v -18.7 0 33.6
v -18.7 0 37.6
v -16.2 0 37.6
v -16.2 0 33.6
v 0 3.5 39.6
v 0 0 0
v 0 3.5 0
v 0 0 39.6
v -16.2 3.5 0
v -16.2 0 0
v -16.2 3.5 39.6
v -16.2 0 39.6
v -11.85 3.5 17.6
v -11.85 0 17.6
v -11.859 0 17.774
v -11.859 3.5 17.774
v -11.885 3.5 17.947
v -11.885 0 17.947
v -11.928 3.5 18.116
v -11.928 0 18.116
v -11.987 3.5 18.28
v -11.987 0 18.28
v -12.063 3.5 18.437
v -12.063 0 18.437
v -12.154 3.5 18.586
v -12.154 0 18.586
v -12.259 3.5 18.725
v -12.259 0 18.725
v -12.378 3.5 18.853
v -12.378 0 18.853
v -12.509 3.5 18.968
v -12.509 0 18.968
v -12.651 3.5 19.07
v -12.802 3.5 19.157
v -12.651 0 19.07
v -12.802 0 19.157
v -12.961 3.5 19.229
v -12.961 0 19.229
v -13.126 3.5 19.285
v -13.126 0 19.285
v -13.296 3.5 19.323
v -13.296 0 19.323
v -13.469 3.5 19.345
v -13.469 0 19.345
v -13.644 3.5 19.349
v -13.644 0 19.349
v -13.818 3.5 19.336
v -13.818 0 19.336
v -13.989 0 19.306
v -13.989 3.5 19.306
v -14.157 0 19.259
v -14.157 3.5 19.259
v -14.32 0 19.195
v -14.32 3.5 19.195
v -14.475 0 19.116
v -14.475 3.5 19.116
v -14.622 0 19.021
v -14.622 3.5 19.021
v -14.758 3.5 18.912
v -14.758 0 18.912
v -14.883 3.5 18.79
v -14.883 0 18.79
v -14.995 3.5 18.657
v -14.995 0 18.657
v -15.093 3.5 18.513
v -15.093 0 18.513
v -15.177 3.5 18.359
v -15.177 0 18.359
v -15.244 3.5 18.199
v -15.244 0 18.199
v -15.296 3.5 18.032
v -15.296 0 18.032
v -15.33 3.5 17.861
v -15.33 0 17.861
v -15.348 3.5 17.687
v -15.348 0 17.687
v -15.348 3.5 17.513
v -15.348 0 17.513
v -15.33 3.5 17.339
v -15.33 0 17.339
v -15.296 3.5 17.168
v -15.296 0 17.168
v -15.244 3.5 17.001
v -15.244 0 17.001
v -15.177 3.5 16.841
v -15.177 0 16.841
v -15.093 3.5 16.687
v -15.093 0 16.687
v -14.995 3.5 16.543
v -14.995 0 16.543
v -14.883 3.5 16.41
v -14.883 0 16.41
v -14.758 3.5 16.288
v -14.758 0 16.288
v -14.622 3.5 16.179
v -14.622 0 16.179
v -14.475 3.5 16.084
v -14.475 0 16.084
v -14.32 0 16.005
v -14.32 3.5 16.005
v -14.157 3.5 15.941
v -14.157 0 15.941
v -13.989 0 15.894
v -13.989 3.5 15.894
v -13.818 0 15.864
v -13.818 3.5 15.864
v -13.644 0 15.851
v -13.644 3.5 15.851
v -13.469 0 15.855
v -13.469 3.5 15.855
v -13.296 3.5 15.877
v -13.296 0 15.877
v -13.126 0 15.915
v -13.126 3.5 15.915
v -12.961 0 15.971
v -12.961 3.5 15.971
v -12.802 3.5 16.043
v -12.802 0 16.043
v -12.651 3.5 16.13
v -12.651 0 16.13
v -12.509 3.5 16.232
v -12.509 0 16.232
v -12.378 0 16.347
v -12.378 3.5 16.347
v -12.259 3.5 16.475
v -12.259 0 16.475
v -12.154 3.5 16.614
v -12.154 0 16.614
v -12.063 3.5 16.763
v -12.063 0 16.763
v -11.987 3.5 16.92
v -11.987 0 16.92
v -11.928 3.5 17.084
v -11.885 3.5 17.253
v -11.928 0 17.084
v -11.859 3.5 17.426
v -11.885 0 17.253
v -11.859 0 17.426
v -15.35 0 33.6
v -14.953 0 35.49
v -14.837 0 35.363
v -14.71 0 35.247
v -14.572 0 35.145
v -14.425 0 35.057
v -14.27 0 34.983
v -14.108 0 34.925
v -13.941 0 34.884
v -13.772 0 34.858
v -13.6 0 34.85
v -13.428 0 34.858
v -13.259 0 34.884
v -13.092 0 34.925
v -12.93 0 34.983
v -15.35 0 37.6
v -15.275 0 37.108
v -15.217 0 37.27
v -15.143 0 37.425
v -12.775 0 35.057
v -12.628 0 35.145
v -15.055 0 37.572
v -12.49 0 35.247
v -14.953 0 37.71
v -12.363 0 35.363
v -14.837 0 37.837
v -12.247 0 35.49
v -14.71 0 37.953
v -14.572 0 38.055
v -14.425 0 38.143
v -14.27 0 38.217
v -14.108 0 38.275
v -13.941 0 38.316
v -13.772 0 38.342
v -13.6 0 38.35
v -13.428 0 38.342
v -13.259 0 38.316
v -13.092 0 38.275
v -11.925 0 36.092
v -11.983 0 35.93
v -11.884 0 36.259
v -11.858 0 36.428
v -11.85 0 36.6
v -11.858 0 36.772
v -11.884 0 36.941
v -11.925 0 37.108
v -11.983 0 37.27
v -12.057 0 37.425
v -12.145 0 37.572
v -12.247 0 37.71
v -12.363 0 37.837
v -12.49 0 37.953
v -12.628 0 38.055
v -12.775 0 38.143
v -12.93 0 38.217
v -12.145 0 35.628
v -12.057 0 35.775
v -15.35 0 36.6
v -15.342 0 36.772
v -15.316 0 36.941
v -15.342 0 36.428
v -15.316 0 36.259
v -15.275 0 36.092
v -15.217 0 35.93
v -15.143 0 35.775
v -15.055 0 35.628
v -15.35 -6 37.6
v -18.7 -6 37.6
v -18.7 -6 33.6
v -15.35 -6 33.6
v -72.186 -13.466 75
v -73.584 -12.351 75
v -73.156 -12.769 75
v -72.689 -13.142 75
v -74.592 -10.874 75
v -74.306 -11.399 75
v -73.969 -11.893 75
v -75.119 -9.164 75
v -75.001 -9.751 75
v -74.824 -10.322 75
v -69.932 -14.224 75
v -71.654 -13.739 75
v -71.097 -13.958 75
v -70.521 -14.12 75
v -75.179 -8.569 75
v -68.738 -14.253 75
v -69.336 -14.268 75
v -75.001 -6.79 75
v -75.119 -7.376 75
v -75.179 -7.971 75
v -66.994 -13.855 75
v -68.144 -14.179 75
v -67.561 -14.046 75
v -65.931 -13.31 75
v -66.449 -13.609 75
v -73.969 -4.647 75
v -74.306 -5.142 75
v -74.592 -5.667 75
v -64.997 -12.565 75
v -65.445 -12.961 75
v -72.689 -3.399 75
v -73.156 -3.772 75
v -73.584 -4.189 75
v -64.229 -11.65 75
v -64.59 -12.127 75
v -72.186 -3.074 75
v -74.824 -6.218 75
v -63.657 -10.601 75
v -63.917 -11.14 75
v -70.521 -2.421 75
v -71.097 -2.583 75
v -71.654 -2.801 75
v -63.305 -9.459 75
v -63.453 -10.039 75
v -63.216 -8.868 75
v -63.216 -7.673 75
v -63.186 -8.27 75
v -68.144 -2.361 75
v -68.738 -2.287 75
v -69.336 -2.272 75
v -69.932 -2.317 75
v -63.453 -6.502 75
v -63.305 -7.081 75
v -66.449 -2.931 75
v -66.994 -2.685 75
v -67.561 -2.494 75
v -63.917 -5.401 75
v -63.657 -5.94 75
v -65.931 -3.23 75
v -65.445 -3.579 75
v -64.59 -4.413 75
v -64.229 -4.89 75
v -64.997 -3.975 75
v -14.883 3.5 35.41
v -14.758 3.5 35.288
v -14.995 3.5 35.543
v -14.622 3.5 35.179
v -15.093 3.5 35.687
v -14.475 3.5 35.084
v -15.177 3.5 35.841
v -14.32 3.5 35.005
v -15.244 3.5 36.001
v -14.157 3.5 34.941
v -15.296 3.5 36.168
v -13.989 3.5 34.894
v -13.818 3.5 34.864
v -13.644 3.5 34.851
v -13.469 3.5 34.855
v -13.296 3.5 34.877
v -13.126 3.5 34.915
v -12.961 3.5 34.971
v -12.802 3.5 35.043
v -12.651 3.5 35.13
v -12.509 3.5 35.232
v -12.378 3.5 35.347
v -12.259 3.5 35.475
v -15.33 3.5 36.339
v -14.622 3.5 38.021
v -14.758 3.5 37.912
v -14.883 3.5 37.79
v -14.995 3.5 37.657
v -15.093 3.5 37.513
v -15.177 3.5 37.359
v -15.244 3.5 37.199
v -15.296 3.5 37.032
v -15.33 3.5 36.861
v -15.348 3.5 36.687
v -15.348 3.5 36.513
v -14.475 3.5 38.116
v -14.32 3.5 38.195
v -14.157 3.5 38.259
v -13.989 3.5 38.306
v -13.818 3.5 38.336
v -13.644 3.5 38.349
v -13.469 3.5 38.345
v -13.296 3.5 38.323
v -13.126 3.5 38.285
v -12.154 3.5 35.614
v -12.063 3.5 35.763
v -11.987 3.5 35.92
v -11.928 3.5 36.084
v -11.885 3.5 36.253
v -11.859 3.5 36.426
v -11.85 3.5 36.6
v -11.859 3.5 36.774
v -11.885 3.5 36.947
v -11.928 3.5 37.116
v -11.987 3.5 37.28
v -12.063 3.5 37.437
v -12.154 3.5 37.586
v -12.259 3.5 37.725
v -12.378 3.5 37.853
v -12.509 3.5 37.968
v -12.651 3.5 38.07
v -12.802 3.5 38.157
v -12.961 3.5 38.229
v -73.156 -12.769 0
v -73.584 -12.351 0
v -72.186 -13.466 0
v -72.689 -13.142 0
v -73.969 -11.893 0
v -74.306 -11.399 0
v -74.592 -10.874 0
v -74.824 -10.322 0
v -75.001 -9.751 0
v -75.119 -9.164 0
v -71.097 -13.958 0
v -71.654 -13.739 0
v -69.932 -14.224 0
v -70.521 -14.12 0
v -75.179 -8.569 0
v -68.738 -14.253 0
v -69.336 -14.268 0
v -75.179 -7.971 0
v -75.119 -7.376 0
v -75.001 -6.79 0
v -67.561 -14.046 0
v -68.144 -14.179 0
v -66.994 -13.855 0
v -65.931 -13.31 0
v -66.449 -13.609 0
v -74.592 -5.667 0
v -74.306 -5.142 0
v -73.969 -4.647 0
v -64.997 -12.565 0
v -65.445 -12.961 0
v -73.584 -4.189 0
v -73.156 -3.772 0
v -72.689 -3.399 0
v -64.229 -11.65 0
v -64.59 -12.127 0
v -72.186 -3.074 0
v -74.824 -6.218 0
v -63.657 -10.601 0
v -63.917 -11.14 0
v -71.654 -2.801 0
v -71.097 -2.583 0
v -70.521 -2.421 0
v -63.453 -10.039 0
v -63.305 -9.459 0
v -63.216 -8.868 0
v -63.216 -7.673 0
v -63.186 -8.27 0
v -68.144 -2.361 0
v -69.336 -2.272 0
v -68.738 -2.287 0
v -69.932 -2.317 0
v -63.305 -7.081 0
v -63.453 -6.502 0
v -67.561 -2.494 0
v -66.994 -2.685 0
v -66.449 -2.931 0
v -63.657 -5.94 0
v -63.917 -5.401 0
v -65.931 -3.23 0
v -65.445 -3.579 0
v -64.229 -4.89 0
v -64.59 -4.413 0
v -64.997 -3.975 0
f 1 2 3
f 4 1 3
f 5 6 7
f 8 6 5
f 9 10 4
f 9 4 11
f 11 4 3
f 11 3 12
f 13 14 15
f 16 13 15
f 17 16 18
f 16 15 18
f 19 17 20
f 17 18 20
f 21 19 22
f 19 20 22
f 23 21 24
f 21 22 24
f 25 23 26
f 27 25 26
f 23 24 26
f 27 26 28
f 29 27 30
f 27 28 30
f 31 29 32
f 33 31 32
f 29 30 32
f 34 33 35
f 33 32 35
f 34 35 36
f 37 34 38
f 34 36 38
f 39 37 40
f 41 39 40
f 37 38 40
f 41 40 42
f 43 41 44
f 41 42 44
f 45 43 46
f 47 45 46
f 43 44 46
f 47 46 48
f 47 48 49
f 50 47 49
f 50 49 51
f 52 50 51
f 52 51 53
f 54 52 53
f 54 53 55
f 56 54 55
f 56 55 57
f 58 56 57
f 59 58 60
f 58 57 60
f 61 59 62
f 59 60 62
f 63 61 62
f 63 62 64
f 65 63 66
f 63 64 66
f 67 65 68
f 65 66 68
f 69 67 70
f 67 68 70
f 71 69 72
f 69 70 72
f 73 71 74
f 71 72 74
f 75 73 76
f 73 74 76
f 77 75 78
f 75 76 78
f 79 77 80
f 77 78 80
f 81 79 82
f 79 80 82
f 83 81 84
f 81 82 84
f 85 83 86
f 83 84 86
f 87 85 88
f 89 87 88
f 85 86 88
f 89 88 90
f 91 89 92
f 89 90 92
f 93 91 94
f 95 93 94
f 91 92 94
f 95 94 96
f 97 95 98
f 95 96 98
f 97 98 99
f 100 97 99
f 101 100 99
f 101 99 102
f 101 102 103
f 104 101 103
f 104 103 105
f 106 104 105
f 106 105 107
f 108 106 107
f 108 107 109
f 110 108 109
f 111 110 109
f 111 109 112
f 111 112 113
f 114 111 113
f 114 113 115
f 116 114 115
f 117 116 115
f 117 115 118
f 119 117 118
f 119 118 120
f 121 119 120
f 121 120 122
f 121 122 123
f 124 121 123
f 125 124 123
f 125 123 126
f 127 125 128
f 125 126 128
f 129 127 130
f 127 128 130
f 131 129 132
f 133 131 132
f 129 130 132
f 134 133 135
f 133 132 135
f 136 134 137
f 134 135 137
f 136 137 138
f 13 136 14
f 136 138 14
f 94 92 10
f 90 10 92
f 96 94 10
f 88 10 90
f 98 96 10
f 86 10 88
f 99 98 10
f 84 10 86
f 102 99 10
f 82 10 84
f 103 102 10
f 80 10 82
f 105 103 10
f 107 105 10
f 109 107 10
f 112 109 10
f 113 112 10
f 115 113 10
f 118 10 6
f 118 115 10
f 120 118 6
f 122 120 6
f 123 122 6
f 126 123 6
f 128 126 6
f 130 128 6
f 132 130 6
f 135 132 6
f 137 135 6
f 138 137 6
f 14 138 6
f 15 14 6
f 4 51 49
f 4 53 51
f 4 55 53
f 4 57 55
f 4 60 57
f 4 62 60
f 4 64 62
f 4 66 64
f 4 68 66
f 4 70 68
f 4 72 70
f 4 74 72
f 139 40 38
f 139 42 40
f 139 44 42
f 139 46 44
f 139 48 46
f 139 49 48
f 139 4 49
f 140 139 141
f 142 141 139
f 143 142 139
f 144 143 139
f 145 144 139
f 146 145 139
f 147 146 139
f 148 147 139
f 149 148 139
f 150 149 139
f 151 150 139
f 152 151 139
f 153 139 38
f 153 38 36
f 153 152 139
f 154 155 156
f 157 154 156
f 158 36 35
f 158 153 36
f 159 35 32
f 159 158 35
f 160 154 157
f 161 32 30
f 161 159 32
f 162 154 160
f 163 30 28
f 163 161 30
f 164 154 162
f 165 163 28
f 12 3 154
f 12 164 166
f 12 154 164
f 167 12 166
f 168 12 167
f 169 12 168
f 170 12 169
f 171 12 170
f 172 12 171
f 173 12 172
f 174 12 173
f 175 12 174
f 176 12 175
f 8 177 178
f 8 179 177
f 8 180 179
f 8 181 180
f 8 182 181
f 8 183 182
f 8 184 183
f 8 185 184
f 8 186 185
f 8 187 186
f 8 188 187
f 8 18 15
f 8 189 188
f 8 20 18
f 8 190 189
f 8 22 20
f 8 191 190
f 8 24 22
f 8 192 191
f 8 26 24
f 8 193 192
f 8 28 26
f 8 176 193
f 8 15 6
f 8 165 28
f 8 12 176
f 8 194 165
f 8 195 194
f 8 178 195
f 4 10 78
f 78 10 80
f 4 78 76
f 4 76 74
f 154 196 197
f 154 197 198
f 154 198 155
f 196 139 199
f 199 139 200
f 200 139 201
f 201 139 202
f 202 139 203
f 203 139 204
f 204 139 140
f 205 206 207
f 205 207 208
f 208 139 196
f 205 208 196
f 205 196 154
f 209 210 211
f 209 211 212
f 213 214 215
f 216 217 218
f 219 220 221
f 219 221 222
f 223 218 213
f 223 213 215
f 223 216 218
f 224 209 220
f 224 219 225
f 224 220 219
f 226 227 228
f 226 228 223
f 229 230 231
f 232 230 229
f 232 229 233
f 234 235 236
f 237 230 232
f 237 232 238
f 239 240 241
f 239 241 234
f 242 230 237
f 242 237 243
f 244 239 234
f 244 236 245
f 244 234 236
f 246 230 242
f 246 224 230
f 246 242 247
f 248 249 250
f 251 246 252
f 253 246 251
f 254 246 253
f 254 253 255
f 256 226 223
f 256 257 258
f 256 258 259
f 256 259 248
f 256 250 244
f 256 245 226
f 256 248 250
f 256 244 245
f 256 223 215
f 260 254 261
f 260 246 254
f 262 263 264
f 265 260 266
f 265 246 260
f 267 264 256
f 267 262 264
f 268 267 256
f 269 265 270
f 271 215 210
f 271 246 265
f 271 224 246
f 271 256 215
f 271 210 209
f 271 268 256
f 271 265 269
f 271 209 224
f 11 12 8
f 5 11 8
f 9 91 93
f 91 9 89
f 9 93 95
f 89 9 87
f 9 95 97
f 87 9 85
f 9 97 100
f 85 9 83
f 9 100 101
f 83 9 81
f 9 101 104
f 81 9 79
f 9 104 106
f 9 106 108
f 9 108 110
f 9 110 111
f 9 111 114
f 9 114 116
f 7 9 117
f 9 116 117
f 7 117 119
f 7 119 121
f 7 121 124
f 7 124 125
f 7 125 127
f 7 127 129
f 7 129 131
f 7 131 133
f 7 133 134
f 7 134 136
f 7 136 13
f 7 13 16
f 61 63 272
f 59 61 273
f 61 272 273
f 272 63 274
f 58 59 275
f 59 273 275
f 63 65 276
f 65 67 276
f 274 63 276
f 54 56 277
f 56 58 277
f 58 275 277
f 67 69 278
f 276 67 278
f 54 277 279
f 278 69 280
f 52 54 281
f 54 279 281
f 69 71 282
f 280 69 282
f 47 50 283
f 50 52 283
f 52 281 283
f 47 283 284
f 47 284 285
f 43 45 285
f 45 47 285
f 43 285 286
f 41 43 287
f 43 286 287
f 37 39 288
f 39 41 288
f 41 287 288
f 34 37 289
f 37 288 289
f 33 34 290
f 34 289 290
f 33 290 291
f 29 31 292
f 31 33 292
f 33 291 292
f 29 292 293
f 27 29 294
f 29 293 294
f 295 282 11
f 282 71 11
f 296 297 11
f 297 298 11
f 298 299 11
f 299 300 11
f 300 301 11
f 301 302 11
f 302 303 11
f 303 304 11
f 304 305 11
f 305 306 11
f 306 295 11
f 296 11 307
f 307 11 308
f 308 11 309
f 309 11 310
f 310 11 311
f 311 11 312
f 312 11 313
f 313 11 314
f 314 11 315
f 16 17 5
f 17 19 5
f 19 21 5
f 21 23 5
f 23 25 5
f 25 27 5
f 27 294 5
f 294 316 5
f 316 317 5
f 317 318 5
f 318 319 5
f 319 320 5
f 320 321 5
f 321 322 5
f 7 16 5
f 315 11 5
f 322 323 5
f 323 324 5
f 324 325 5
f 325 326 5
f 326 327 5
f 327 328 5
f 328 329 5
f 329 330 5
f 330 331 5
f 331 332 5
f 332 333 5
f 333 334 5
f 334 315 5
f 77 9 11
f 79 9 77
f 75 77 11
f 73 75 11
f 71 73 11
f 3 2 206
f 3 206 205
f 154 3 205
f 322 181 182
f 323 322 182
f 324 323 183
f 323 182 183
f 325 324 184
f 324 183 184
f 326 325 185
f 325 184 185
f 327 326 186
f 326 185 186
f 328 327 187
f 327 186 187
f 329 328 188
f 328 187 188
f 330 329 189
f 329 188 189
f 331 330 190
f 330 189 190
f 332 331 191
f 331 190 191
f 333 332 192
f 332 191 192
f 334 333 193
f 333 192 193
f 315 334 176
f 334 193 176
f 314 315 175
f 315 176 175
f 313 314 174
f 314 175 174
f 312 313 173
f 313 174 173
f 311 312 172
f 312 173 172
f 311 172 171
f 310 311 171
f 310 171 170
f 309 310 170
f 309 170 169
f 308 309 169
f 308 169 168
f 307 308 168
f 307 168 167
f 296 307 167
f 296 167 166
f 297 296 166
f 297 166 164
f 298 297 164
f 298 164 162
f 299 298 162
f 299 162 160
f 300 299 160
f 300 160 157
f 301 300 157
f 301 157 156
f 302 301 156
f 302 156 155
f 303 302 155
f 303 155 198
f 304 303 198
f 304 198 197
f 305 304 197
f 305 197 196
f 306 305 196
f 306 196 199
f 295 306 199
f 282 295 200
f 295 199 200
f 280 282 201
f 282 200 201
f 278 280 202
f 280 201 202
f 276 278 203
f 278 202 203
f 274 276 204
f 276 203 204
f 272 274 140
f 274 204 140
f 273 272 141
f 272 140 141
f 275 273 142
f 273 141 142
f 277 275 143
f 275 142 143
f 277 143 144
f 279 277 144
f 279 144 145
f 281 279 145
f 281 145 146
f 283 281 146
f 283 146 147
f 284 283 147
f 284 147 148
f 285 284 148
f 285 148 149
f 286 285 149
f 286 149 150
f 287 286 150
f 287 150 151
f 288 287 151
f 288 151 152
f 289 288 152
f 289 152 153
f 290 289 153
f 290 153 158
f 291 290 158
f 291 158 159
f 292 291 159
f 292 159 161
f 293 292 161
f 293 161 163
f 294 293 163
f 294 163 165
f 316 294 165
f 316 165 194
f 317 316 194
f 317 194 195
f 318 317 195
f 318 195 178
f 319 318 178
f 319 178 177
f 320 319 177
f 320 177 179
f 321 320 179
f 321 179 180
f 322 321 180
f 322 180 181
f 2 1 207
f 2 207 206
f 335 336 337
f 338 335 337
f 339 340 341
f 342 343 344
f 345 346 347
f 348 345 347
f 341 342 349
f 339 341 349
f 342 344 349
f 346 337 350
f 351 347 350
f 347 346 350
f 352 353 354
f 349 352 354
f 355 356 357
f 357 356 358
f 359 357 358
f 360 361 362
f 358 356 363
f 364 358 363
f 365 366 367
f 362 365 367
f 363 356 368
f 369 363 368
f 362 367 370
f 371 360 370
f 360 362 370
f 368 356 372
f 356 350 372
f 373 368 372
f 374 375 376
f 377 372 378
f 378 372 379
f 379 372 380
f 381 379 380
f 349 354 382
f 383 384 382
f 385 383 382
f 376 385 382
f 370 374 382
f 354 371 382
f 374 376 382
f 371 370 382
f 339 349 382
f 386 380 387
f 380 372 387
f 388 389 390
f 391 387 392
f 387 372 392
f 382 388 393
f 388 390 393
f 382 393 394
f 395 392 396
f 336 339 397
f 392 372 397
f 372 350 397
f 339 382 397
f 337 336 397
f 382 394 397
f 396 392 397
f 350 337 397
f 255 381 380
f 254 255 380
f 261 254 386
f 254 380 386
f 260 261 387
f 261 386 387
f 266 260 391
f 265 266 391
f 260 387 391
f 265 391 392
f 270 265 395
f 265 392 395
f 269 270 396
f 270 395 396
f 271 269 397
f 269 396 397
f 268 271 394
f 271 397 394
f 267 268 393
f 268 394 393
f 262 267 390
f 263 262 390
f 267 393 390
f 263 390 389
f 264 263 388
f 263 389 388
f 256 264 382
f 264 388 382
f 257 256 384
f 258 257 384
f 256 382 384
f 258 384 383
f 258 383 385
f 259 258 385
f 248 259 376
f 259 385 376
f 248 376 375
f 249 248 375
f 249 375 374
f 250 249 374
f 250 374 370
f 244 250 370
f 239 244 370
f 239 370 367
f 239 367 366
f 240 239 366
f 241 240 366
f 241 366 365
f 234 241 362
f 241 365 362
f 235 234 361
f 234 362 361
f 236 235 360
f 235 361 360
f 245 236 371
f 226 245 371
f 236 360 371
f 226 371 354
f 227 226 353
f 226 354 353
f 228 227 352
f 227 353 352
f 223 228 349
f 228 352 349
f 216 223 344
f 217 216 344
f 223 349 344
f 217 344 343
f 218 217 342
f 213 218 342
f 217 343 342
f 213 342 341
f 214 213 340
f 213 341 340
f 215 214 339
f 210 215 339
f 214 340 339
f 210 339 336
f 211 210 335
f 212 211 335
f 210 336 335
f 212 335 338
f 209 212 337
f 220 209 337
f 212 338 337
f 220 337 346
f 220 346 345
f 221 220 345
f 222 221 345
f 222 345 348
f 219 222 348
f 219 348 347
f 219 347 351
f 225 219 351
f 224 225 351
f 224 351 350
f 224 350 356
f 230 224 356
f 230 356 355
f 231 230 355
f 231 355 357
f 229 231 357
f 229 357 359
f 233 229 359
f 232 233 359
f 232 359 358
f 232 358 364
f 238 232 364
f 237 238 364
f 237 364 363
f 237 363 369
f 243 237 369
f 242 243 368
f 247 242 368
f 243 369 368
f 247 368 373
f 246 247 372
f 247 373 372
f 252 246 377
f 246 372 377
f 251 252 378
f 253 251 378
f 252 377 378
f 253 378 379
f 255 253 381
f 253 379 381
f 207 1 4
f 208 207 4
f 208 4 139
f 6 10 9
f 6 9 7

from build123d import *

# Parameters (mm, degrees)
F0_R     = 6
F1_DEPTH = 75
F2_W     = 16.2
F2_H     = 39.6
F2_R     = 1.75
F3_DEPTH = 3.5
F4_W     = 3.35
F4_H     = 4
F5_DEPTH = 6


with BuildPart() as f1:
    # F0 (on Top) → F1 (new body)
    with BuildSketch(Plane.XY):
        with Locations((-69.186163, -8.270208)):
            Circle(F0_R)
    extrude(amount=F1_DEPTH)


with BuildPart() as f3:
    # F2 (on Front) → F3 (new body)
    with BuildSketch(Plane.XZ):
        with Locations((-8.1, 19.8)):
            Rectangle(F2_W, F2_H)
        with Locations((-13.6, 17.6)):
            Circle(F2_R, mode=Mode.SUBTRACT)
        with Locations((-13.6, 36.6)):
            Circle(F2_R, mode=Mode.SUBTRACT)
    extrude(amount=-F3_DEPTH)

    # F4 (on Front) → F5 (join)
    with BuildSketch(Plane.XZ):
        with Locations((-17.025, 35.6)):
            Rectangle(F4_W, F4_H)
    extrude(amount=F5_DEPTH)


solid = Compound([f1.part, f3.part])
